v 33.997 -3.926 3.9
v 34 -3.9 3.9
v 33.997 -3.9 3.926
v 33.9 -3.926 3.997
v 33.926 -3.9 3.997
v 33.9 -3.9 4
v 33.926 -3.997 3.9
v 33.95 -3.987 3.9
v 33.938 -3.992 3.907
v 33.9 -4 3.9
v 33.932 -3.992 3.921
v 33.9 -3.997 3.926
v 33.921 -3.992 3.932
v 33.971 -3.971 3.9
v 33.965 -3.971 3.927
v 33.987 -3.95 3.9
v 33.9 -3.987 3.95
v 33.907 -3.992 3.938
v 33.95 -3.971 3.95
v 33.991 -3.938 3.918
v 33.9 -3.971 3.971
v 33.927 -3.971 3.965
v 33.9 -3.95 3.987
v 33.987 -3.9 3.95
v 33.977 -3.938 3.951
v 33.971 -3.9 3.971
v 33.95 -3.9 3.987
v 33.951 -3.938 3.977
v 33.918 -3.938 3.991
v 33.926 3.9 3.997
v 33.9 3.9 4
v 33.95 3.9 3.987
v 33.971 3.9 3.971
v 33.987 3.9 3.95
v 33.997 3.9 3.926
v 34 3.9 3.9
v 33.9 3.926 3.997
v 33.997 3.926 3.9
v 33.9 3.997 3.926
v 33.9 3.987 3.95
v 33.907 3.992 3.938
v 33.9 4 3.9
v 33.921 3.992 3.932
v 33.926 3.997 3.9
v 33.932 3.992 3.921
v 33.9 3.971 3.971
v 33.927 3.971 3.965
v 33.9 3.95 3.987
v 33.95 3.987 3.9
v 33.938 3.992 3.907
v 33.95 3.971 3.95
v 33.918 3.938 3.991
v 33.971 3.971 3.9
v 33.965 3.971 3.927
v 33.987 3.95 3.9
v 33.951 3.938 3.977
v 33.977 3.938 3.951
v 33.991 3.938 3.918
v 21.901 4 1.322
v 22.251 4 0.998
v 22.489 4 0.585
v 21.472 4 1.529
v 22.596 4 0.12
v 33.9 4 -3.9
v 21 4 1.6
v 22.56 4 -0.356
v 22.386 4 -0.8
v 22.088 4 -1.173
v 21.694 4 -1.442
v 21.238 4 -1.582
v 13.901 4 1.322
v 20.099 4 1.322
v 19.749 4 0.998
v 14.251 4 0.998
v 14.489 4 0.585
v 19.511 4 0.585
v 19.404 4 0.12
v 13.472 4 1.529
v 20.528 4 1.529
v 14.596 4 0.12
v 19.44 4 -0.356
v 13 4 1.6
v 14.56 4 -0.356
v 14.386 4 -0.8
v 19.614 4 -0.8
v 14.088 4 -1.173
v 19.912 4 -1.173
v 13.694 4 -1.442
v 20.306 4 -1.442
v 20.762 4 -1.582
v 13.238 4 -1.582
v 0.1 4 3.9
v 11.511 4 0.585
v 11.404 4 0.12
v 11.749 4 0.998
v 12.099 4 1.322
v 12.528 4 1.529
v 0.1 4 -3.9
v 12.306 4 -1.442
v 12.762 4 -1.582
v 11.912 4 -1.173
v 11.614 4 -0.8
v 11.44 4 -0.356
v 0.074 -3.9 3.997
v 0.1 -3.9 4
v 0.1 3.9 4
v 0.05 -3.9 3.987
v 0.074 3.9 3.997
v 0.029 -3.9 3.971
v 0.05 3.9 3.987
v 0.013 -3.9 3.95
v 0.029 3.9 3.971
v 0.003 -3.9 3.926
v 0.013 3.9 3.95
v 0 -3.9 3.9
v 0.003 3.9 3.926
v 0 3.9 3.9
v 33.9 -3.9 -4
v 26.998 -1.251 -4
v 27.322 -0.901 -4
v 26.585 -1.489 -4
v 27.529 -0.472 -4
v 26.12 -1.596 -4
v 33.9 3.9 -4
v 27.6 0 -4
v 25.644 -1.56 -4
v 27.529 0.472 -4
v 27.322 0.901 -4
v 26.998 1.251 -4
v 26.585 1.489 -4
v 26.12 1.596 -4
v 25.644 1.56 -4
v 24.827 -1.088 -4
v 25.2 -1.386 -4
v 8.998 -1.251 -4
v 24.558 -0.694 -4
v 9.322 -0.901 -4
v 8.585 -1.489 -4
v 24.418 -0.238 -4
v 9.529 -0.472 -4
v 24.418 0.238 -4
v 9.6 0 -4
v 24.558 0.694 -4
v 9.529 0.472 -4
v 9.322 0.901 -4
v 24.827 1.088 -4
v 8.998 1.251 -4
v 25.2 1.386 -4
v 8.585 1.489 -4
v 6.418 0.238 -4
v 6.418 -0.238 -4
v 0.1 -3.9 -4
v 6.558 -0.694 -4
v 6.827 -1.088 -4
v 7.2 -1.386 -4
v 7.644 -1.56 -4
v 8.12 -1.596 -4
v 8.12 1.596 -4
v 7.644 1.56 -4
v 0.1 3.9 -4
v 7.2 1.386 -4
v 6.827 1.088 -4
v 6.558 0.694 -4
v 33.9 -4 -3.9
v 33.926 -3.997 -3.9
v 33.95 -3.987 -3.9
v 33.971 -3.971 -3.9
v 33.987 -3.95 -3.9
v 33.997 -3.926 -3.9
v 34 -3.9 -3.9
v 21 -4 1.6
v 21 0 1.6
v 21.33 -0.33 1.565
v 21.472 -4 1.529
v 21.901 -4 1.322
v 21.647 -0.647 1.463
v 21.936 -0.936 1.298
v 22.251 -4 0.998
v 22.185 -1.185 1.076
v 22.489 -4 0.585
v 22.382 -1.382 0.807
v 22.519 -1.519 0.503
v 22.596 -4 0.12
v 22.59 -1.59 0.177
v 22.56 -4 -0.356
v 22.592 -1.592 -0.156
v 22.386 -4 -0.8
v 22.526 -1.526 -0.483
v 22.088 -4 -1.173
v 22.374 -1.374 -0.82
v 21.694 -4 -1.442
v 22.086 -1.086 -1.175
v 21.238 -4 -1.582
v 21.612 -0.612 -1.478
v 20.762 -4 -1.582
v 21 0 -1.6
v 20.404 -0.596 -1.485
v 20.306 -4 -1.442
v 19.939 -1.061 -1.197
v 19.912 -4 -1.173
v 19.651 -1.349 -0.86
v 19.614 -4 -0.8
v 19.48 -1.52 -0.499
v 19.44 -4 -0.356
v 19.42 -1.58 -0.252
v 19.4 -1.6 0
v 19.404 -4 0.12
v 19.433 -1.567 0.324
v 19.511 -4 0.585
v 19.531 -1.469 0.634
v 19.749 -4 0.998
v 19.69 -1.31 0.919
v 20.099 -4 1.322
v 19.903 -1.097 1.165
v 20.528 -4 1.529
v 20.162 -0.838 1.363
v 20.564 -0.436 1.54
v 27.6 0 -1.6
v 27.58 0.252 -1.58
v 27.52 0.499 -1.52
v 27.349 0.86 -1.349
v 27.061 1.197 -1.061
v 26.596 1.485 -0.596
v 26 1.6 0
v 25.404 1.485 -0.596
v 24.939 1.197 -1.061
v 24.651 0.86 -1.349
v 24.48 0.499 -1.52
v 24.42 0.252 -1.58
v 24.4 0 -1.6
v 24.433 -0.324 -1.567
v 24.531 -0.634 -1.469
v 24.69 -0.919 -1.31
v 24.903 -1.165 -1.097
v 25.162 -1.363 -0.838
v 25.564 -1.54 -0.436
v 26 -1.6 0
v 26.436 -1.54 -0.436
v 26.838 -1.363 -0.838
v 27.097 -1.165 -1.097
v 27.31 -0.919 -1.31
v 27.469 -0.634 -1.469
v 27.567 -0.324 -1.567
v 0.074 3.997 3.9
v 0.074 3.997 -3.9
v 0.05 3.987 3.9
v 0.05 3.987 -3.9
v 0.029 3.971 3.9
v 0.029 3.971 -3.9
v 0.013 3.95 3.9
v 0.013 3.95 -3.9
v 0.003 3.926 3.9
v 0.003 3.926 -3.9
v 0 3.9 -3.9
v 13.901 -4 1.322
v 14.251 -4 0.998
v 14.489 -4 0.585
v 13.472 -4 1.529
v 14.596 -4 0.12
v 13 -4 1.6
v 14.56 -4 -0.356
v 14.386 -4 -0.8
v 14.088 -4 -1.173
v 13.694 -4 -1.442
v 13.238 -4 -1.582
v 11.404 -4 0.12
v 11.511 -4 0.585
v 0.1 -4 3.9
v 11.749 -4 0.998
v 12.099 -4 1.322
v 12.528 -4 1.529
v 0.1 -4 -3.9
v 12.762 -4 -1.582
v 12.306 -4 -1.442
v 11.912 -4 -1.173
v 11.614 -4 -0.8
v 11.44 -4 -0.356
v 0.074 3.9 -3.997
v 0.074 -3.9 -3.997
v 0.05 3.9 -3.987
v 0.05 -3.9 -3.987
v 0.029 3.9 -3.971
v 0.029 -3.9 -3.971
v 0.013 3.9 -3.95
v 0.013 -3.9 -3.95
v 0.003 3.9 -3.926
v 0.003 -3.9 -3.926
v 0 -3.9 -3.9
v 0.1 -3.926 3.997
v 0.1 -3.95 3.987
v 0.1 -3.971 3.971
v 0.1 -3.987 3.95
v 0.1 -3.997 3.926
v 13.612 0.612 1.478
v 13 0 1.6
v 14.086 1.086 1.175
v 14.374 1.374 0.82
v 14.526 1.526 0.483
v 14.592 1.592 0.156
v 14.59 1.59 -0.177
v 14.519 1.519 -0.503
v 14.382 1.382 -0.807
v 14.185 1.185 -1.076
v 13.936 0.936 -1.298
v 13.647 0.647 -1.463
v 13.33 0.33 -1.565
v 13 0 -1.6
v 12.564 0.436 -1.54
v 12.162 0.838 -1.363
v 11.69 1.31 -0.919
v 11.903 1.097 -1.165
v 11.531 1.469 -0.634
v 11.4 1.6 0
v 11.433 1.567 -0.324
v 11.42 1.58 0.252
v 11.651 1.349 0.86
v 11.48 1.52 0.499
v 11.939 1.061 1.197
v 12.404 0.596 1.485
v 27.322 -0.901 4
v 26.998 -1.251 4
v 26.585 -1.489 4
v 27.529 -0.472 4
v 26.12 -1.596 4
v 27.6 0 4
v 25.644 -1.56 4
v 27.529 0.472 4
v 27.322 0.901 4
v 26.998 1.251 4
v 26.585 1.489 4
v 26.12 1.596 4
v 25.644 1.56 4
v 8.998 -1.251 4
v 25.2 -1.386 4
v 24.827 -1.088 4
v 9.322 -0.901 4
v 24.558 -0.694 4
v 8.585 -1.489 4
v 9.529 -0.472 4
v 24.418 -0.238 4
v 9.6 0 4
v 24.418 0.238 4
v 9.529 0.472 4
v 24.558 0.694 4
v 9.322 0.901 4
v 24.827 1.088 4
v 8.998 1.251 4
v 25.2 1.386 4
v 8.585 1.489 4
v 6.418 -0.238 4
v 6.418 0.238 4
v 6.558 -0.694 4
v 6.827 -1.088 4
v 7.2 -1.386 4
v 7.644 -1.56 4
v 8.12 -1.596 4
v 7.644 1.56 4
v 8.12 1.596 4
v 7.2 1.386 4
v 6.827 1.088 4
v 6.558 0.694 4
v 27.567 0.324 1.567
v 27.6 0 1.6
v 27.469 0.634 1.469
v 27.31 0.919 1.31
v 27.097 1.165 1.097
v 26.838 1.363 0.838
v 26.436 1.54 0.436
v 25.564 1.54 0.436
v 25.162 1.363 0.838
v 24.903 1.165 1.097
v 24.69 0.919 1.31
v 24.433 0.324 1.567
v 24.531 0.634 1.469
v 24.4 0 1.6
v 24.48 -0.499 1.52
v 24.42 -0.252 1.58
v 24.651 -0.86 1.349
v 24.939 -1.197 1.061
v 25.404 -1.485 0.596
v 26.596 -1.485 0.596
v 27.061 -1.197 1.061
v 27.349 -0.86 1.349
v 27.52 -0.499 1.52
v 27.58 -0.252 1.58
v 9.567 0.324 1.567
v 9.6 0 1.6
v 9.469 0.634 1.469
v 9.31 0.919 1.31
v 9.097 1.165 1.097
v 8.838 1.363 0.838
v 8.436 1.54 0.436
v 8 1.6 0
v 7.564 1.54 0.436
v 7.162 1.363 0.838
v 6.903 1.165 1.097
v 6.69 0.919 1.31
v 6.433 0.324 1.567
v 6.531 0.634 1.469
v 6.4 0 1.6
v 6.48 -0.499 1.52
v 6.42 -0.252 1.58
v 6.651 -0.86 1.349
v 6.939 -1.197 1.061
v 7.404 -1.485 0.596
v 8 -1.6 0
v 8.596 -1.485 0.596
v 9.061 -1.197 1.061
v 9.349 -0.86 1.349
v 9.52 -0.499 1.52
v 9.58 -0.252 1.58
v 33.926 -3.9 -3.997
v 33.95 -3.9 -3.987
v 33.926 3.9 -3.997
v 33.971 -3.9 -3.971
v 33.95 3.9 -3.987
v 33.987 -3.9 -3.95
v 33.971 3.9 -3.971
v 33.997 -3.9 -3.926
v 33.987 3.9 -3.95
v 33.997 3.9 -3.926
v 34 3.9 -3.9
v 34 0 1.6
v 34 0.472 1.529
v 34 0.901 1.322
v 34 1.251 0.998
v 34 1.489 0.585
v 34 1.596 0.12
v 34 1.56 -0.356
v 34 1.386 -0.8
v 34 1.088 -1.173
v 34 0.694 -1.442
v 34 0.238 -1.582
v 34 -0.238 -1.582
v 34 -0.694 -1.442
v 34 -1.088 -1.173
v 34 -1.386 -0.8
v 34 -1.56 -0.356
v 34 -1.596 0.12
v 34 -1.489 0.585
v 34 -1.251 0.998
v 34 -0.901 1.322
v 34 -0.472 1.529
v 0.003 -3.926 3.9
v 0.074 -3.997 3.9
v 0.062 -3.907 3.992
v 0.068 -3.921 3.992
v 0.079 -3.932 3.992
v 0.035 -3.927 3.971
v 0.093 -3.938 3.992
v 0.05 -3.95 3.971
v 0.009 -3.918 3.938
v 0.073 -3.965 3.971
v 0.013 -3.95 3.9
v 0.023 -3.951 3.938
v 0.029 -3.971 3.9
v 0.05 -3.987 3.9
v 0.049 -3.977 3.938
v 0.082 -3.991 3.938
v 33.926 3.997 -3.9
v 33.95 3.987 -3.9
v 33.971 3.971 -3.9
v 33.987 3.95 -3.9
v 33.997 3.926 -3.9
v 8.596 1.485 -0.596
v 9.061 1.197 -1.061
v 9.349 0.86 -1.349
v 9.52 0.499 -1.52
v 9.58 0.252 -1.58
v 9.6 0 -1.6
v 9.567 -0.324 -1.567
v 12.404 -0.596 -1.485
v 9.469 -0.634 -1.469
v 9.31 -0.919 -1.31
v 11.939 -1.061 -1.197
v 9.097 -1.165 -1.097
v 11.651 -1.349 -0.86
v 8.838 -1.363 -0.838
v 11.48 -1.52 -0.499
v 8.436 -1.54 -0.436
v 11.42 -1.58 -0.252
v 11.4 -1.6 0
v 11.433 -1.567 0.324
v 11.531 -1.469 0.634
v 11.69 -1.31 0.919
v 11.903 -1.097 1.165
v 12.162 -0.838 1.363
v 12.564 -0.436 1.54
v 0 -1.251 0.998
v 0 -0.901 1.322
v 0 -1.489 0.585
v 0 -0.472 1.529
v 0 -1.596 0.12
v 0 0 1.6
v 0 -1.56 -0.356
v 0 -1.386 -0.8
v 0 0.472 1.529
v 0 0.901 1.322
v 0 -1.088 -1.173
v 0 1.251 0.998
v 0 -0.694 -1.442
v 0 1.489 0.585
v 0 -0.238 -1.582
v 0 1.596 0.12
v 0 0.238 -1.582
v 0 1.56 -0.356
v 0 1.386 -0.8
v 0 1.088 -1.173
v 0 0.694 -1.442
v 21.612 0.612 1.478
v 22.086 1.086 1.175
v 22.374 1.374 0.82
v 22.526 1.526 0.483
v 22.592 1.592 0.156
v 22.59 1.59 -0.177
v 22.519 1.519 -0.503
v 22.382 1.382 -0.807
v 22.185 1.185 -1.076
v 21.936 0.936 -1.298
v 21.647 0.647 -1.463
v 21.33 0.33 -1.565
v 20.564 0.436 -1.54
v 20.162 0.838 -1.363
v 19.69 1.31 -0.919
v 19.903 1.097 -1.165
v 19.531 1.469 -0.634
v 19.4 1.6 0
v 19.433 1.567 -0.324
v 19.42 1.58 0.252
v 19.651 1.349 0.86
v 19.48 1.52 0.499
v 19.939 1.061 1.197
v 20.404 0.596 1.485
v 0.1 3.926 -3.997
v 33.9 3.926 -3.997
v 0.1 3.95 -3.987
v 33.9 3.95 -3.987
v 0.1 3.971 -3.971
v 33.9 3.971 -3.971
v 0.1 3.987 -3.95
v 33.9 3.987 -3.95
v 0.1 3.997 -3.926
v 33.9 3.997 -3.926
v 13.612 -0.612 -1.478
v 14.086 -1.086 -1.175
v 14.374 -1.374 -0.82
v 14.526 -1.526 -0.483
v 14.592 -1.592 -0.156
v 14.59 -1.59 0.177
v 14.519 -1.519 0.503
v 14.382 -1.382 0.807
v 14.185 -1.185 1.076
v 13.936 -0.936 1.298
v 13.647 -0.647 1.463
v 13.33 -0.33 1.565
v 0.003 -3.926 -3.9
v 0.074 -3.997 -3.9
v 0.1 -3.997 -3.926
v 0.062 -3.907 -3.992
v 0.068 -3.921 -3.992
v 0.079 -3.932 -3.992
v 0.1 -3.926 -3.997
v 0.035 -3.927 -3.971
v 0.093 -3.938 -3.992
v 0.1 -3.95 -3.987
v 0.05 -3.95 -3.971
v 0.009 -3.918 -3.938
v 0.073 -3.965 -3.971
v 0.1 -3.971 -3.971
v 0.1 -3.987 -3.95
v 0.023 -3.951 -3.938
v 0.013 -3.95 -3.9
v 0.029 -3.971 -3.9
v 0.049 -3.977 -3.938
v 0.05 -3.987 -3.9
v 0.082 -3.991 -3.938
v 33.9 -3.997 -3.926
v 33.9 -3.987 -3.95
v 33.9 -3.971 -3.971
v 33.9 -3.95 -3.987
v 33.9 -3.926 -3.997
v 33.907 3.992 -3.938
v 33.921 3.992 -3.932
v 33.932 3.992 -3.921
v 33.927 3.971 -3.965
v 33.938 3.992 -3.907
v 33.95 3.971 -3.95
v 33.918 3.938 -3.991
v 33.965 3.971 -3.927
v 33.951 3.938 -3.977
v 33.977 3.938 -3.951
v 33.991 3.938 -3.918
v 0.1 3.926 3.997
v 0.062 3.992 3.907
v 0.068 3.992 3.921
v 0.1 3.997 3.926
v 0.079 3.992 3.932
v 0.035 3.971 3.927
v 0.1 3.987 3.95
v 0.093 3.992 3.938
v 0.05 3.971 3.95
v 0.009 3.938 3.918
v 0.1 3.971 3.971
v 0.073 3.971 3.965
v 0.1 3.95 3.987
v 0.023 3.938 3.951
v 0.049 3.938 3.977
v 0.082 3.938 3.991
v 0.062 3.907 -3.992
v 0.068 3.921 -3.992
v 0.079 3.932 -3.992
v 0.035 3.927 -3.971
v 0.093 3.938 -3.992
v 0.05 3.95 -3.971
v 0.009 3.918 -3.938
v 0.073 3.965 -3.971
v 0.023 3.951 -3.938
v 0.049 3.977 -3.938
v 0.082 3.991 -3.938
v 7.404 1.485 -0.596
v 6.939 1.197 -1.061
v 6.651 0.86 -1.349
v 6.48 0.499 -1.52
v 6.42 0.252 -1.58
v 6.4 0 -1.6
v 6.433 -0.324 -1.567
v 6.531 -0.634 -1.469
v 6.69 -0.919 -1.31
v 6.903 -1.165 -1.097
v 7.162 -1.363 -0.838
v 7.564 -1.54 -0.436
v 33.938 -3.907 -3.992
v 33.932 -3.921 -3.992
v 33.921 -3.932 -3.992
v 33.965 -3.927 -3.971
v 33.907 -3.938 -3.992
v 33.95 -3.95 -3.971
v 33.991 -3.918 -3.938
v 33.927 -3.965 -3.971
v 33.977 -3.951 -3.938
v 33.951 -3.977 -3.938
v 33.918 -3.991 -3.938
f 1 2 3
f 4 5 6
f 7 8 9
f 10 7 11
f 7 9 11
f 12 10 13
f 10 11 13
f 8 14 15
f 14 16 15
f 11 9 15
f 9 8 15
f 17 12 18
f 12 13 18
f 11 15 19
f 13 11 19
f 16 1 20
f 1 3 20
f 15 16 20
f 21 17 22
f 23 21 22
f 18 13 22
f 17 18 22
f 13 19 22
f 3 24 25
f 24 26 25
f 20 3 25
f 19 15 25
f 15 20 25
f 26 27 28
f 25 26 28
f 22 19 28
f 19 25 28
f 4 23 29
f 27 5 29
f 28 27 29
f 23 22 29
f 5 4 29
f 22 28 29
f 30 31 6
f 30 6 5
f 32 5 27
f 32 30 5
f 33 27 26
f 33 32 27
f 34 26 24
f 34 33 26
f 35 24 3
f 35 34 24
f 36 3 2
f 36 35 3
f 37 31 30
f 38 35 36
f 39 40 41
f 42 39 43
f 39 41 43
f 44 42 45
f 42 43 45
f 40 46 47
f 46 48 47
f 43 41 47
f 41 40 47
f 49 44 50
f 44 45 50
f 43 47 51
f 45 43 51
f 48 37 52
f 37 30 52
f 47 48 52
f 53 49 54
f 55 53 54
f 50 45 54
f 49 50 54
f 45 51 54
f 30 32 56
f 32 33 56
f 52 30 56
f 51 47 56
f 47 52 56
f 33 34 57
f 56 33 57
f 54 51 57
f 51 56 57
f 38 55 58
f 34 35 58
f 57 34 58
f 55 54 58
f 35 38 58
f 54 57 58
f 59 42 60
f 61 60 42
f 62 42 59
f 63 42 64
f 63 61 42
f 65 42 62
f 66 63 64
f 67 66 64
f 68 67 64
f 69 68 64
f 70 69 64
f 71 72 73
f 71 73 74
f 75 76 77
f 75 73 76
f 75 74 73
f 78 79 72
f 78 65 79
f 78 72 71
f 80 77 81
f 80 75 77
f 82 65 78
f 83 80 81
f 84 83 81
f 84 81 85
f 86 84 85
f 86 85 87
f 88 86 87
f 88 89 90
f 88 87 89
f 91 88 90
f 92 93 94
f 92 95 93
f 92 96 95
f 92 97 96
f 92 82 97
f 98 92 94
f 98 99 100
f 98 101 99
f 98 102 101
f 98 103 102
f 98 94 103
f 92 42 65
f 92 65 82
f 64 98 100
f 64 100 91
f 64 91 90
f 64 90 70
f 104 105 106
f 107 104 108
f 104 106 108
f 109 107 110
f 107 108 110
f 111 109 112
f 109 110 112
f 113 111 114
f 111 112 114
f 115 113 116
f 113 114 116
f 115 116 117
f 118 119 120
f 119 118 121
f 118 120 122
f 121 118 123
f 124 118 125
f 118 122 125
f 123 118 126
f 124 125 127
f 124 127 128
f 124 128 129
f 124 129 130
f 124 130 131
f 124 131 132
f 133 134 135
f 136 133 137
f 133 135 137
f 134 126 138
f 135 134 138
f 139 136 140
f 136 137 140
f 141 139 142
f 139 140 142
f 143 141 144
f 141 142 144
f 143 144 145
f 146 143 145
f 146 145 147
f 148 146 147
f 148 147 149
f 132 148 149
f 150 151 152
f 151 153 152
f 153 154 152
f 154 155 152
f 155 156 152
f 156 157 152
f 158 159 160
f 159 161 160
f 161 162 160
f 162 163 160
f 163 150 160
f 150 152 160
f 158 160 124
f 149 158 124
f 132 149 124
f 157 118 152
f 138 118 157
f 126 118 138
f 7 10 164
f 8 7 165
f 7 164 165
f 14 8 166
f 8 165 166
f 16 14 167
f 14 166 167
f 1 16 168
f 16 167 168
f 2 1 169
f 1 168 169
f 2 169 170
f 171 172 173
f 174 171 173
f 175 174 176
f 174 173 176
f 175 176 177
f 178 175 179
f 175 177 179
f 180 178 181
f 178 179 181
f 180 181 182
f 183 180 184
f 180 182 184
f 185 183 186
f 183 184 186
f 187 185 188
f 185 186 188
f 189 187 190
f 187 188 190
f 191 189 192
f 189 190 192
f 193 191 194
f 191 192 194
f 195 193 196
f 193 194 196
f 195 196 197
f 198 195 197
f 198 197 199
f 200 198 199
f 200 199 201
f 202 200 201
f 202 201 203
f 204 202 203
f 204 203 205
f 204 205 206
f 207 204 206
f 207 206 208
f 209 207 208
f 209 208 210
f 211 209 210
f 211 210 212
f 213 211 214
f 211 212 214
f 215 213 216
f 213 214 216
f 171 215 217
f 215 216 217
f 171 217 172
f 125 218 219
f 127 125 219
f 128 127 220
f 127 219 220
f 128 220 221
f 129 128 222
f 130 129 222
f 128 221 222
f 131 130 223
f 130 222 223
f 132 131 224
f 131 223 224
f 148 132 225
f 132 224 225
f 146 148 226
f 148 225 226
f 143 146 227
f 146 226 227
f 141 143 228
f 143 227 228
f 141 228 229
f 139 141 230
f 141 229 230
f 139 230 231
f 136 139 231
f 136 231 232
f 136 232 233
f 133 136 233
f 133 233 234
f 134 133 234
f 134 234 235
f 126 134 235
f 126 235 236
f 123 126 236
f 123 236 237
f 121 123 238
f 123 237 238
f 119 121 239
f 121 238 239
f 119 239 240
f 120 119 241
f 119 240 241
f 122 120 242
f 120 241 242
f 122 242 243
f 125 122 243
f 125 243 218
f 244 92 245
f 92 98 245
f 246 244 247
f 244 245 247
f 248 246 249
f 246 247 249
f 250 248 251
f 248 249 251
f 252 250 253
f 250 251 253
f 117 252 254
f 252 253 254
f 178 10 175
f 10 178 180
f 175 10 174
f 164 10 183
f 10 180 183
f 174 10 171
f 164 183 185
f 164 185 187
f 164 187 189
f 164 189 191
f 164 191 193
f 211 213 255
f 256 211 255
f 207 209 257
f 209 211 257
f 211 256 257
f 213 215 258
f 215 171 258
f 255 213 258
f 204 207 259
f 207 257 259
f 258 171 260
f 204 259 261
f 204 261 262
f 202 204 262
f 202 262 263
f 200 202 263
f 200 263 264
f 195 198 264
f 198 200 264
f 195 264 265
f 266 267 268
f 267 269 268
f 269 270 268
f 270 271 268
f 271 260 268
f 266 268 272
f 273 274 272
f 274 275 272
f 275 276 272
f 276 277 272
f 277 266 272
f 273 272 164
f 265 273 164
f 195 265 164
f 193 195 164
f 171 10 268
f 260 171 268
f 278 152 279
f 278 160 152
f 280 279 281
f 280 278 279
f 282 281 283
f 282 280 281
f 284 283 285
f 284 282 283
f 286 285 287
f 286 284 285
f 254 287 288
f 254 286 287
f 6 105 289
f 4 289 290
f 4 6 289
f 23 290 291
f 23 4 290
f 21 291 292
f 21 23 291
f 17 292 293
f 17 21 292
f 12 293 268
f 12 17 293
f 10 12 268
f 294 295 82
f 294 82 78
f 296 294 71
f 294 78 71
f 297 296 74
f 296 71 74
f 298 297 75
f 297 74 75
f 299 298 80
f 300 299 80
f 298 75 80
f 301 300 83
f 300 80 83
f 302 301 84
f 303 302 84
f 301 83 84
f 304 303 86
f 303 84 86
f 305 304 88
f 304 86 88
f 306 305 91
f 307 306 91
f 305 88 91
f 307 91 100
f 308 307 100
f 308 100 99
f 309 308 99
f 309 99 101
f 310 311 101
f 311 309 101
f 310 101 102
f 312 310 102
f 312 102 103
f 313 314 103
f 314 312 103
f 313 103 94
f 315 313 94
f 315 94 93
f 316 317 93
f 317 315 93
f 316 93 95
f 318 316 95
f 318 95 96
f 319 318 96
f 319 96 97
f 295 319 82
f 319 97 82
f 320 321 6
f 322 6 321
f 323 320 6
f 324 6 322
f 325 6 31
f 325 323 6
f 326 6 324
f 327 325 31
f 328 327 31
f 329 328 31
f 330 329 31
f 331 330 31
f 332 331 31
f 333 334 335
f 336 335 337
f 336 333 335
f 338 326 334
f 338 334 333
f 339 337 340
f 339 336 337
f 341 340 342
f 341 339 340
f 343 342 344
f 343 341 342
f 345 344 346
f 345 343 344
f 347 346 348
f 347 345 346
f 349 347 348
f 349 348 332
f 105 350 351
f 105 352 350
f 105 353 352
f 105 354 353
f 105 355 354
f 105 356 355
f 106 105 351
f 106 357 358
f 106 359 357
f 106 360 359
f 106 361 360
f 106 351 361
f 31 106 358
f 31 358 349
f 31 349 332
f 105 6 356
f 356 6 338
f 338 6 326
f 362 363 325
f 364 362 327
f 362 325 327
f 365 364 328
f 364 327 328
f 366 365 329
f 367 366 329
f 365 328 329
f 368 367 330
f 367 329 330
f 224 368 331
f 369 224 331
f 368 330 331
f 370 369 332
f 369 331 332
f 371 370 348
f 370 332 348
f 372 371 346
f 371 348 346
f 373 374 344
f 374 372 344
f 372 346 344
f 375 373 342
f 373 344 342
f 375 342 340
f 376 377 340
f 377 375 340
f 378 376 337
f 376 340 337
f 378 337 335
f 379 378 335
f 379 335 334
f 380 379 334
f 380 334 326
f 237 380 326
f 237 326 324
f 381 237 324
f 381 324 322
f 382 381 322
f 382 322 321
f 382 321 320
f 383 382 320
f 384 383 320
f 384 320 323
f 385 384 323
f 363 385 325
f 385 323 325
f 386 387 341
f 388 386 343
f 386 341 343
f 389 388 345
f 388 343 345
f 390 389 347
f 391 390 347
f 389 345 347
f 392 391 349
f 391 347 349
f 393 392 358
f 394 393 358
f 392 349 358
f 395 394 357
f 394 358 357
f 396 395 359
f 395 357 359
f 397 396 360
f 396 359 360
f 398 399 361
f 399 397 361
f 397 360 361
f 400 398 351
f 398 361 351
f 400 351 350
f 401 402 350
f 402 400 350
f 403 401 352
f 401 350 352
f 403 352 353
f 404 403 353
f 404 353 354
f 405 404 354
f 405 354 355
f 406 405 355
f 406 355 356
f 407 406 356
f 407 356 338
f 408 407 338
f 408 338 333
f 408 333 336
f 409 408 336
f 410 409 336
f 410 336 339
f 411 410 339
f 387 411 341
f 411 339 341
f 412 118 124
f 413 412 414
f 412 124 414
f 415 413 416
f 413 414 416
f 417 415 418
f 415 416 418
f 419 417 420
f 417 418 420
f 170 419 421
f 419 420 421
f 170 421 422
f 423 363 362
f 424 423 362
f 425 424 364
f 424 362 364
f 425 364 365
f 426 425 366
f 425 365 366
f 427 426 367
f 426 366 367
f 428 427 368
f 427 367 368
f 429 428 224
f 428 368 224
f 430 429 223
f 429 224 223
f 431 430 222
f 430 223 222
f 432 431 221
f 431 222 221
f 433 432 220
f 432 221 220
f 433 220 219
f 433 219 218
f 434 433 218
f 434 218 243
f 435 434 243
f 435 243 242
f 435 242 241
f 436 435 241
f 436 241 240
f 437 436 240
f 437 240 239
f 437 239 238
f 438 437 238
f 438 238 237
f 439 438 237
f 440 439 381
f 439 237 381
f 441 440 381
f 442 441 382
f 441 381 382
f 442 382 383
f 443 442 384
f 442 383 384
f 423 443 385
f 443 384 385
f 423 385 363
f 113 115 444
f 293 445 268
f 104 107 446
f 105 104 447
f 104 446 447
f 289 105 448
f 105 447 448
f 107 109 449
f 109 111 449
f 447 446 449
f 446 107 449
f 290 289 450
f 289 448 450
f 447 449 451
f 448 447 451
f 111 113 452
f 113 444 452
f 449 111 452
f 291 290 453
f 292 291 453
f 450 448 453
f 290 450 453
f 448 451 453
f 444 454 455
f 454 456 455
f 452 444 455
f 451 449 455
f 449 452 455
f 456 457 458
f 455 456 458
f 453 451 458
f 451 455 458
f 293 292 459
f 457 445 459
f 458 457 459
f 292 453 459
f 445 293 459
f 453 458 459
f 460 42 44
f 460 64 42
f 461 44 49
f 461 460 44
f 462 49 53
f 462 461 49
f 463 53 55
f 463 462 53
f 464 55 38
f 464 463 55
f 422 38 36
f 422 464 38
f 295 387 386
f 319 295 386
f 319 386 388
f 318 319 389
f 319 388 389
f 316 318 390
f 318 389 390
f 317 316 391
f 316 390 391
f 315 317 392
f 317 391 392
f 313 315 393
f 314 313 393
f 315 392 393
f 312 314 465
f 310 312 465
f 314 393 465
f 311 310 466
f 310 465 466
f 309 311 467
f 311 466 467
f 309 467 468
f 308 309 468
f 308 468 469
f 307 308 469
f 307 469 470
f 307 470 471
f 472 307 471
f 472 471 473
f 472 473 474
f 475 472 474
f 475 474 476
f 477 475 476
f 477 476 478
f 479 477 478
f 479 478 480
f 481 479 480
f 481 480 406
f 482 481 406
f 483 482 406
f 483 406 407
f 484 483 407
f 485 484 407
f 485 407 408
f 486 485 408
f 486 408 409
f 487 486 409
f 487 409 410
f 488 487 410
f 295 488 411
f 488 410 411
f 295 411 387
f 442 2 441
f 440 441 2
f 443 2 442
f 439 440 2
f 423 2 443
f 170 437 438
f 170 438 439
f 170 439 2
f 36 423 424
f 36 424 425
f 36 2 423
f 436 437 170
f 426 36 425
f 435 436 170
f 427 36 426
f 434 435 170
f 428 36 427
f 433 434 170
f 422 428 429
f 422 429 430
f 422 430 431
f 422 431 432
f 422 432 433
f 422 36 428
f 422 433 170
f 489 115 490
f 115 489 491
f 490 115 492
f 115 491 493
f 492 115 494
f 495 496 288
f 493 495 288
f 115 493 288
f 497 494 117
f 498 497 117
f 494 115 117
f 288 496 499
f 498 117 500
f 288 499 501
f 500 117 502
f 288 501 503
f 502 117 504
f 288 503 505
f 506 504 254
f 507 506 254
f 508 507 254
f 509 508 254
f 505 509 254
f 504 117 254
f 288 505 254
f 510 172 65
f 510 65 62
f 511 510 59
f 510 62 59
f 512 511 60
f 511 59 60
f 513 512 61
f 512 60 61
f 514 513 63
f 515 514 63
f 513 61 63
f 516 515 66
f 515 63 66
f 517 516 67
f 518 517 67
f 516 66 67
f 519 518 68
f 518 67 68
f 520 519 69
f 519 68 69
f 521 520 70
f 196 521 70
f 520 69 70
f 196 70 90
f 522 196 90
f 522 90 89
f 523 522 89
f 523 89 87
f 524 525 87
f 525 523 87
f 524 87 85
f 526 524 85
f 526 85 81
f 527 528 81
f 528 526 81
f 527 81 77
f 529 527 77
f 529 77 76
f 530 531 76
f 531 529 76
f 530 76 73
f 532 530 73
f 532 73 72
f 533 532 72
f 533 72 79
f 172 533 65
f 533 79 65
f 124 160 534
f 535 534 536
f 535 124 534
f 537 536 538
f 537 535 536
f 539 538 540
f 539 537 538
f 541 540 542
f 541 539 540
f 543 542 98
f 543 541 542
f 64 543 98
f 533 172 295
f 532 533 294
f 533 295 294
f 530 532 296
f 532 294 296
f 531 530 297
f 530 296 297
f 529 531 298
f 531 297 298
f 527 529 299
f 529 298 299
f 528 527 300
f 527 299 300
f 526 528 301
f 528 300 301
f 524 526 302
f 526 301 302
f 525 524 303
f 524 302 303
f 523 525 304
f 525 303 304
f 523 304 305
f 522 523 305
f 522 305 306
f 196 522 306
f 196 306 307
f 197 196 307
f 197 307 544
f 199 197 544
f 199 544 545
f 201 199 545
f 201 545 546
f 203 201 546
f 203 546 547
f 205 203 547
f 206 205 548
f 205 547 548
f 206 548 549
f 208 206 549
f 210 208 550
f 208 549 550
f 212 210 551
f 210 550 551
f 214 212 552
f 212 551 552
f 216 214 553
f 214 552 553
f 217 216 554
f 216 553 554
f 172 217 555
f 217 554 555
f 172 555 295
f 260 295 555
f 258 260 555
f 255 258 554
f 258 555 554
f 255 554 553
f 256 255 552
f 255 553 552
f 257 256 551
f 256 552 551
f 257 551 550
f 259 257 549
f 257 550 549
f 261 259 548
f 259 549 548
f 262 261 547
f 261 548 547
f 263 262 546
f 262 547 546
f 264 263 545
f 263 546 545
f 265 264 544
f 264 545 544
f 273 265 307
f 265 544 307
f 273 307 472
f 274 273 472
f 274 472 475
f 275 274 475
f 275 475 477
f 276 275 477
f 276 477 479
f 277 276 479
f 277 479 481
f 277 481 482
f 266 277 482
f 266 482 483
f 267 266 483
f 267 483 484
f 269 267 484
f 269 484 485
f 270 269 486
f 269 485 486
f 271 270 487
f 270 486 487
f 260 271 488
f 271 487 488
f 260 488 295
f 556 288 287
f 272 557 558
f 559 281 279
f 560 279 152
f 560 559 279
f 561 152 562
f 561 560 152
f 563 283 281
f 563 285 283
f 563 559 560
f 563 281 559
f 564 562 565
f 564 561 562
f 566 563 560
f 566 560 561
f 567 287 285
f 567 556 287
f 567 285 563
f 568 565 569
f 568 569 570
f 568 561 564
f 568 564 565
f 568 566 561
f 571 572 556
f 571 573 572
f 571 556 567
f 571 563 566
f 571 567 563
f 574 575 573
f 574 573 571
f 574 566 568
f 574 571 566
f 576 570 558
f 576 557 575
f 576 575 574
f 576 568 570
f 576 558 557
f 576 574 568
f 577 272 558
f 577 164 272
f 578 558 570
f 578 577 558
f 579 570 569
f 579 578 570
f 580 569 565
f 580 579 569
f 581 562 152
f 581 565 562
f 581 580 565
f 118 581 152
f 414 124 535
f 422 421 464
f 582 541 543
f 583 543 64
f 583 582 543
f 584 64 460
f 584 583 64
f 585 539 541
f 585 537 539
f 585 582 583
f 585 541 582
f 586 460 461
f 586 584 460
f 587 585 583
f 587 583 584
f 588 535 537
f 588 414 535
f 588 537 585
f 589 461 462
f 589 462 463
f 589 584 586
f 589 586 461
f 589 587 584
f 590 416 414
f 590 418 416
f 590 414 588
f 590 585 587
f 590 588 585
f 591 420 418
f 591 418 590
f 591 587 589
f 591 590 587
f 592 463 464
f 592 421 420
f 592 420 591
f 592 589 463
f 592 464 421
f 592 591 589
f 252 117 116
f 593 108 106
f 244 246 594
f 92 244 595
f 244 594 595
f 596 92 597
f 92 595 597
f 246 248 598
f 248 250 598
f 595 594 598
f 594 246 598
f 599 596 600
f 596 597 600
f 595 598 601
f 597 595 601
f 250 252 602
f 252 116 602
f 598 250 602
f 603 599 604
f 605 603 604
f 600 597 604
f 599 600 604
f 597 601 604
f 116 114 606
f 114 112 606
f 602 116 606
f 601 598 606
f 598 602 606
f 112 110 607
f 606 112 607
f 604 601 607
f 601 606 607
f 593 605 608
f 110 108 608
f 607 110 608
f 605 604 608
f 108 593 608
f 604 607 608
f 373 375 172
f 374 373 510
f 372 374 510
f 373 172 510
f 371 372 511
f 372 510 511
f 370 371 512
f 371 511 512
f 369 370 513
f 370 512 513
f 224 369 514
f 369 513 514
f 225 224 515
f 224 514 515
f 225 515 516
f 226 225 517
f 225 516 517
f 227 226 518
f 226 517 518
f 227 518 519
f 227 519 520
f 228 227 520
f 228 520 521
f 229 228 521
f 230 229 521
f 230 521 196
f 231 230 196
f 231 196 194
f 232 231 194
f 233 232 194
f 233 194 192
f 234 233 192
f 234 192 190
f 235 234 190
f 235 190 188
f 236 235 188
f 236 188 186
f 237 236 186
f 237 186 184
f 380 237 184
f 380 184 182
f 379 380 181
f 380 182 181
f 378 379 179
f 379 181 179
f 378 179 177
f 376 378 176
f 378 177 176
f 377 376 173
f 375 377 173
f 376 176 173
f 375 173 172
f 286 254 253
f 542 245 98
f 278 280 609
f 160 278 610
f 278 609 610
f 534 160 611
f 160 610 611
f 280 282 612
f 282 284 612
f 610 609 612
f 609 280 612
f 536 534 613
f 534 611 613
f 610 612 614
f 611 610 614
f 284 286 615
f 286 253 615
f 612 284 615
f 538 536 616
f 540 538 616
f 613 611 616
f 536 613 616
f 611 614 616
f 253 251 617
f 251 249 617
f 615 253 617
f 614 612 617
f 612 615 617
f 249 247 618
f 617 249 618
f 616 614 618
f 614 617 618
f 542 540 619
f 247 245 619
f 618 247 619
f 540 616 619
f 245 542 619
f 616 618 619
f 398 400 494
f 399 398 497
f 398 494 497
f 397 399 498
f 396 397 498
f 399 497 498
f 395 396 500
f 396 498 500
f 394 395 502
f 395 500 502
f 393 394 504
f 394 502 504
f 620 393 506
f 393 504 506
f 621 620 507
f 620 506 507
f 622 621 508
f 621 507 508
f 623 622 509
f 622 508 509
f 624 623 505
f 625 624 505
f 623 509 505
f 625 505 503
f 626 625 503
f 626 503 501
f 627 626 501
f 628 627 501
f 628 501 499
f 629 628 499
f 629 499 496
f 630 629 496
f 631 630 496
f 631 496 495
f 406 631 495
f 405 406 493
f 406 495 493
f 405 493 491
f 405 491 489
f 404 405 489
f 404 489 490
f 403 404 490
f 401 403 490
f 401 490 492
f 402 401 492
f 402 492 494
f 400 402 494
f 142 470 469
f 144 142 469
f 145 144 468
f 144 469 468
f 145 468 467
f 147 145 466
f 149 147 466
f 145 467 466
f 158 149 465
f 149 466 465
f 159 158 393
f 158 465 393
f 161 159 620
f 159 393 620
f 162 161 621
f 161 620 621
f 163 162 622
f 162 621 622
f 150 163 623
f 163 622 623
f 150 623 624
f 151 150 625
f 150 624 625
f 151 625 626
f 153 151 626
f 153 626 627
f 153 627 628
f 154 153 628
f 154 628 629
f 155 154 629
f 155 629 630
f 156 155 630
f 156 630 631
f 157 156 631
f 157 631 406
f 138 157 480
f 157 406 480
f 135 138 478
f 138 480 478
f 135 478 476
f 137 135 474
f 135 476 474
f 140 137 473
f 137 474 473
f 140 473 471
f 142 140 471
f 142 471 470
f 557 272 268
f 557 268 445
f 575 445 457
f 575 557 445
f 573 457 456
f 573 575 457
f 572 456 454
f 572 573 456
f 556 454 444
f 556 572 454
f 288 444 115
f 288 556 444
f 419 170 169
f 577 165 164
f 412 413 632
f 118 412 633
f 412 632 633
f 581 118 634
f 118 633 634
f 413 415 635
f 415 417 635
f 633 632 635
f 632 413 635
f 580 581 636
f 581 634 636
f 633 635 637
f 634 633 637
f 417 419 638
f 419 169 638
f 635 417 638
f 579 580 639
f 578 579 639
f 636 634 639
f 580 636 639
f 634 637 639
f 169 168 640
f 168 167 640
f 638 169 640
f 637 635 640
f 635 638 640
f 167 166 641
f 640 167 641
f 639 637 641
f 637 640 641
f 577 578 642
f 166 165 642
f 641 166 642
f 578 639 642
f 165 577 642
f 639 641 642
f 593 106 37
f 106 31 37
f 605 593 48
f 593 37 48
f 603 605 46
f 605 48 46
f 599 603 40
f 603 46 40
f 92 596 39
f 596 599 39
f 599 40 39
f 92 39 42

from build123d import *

# Parameters (mm, degrees)
SKETCH_1_W          = 8
SKETCH_1_H          = 8
EXTRUDE_1_DEPTH     = 34
FILLET_1_R          = 0.1
SKETCH_2_R          = 1.6
CUT_EXTRUDE_1_DEPTH = 35.467375879
SKETCH_3_R          = 1.6
CUT_EXTRUDE_2_DEPTH = 36.156791662
SKETCH_4_R          = 1.6
CUT_EXTRUDE_3_DEPTH = 36.156791662


with BuildPart() as part:
    # 草图1 → 凸台-拉伸1 (new body)
    with BuildSketch(Plane(origin=(0, 0, 0), x_dir=(0, 0, -1), z_dir=(1, 0, 0))):
        Rectangle(SKETCH_1_W, SKETCH_1_H)
    extrude(amount=EXTRUDE_1_DEPTH)

    # 圆角1
    fillet_1_edges = [part.edges().sort_by_distance(p)[0] for p in [
        (34, 0, 4),
        (34, -4, 0),
        (34, 0, -4),
        (0, -4, 0),
        (0, 0, 4),
        (0, 4, 0),
        (0, 0, -4),
        (17, -4, -4),
        (17, -4, 4),
        (17, 4, 4),
        (17, 4, -4),
        (34, 4, 0),
    ]]
    fillet(fillet_1_edges, radius=FILLET_1_R)

    # 草图2 → 切除-拉伸1 (cut, through all)
    with BuildSketch(Plane.ZY):
        Circle(SKETCH_2_R)
    extrude(amount=-CUT_EXTRUDE_1_DEPTH, mode=Mode.SUBTRACT)

    # 草图3 → 切除-拉伸2 (cut, through all)
    with BuildSketch(Plane.XY.offset(4)):
        with Locations((8, 0)):
            Circle(SKETCH_3_R)
        with Locations((26, 0)):
            Circle(SKETCH_3_R)
    extrude(amount=-CUT_EXTRUDE_2_DEPTH, mode=Mode.SUBTRACT)

    # 草图4 → 切除-拉伸3 (cut, through all)
    with BuildSketch(Plane(origin=(0, 4, 0), x_dir=(1, 0, 0), z_dir=(0, 1, 0))):
        with Locations(Location((21, 0, 0), (0, 0, 270))):
            Circle(SKETCH_4_R)
        with Locations(Location((13, 0, 0), (0, 0, 270))):
            Circle(SKETCH_4_R)
    extrude(amount=-CUT_EXTRUDE_3_DEPTH, mode=Mode.SUBTRACT)


solid = part.part
